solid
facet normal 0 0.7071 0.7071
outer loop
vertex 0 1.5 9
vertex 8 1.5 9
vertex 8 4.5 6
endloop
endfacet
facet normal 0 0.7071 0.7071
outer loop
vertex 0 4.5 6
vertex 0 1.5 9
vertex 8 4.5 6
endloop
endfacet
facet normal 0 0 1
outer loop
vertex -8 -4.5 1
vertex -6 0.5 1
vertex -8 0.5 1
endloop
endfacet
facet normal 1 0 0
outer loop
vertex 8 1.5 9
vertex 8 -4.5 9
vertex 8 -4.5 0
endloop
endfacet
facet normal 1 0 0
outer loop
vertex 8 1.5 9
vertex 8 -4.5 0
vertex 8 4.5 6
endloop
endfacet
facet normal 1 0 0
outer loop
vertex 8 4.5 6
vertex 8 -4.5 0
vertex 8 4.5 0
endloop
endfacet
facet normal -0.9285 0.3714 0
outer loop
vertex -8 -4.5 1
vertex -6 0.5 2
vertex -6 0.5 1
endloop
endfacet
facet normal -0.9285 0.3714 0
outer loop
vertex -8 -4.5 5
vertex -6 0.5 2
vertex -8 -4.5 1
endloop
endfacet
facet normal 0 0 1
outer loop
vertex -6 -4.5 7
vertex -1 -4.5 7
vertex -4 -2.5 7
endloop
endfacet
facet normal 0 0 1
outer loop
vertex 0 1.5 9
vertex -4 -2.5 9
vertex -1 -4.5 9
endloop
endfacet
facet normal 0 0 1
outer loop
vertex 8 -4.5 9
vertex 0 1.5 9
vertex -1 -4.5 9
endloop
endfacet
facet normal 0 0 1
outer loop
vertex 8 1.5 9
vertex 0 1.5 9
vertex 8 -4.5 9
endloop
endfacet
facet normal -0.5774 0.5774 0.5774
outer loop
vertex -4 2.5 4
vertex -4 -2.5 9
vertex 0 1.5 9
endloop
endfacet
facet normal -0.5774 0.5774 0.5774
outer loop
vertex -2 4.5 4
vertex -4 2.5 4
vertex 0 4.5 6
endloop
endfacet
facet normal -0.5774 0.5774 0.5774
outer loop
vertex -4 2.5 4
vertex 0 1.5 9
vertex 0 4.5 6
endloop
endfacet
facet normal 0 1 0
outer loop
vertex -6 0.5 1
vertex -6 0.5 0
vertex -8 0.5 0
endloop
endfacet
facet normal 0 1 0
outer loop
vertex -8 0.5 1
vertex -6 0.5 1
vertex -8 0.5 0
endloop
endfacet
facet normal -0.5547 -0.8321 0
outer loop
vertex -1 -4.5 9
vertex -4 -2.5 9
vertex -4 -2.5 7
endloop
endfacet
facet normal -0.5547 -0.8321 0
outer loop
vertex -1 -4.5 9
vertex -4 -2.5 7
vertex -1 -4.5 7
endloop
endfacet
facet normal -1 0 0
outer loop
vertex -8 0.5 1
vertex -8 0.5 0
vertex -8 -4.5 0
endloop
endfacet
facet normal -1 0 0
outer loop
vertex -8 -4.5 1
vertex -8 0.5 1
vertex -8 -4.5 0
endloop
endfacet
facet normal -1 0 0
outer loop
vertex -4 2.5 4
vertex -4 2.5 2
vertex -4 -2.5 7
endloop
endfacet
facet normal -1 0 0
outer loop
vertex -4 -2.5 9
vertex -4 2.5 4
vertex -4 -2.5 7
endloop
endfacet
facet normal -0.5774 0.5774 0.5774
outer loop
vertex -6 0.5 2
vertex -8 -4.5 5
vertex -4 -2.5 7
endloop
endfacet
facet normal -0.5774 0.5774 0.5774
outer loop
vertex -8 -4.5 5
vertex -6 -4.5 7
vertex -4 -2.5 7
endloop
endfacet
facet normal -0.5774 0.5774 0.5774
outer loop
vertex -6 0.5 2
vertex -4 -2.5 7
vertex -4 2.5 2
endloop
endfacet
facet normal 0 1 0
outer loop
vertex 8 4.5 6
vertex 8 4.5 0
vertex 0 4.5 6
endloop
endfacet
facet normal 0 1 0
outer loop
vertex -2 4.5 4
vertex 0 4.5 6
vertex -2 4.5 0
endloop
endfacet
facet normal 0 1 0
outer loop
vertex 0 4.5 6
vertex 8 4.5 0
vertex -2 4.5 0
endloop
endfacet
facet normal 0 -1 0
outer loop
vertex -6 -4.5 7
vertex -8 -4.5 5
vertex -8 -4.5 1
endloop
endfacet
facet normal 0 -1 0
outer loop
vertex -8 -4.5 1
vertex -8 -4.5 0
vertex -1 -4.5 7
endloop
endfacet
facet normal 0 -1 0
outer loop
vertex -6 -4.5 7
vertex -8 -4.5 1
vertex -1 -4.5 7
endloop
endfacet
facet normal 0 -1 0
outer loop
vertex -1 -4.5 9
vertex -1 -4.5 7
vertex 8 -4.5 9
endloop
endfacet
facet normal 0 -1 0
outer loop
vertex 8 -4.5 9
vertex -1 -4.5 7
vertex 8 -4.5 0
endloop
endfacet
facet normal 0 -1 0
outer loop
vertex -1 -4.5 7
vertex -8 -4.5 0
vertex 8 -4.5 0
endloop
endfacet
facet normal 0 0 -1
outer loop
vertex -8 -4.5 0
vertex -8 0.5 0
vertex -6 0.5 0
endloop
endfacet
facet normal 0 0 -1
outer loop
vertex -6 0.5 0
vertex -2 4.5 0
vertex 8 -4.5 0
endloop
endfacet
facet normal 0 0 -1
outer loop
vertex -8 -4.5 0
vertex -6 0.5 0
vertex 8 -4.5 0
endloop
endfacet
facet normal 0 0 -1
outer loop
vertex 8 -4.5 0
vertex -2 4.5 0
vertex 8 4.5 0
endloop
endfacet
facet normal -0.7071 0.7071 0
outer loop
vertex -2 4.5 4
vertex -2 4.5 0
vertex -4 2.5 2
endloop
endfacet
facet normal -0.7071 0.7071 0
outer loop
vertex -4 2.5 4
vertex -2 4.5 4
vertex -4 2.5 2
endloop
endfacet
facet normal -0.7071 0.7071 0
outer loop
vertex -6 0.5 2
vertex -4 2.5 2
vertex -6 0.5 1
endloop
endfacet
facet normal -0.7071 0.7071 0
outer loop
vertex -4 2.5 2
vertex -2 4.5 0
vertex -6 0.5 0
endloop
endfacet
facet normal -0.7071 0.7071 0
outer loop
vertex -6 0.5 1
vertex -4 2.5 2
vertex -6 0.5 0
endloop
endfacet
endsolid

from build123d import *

# Parameters (mm, degrees)
BOSS_EXTRUDE1_DEPTH = 9
CUT_EXTRUDE1_DEPTH  = 8
CUT_EXTRUDE2_DEPTH  = 8
CUT_EXTRUDE3_DEPTH  = 8
CUT_EXTRUDE4_DEPTH  = 8
CUT_EXTRUDE5_DEPTH  = 2


with BuildPart() as part:
    # Sketch1 → Boss-Extrude1 (new body)
    with BuildSketch(Plane.XY):
        Polygon((-6, 0.5), (-8, 0.5), (-8, -4.5), (8, -4.5), (8, 4.5), (-2, 4.5), align=None)
    extrude(amount=BOSS_EXTRUDE1_DEPTH)

    # Sketch2 → Cut-Extrude1 (cut)
    with BuildSketch(Plane.XY.offset(9)):
        Polygon((-8, 0.5), (-6, 0.5), (-8, -4.5), align=None)
    extrude(amount=-CUT_EXTRUDE1_DEPTH, mode=Mode.SUBTRACT)

    # 3DSketch1 → Cut-Extrude2 (cut, along a direction that is not the sketch's normal)
    with BuildSketch(Plane(origin=(-8, -4.5, 5), x_dir=(0.464990554975277, 0.8137334712067351, -0.3487429162314579), z_dir=(0.5773502691896258, -0.5773502691896257, -0.5773502691896258))):
        Polygon((0, 0), (6.044877215, -1.208080899), (8.602325267, 0), (2.78994333, 4.026936331), (0.232495277, 2.818855432), align=None)
    extrude(amount=-CUT_EXTRUDE2_DEPTH, dir=(0, 0, -1), mode=Mode.SUBTRACT)

    # 3DSketch2 → Cut-Extrude3 (cut, along a direction that is not the sketch's normal)
    with BuildSketch(Plane(origin=(-4, -2.5, 9), x_dir=(0.2264554068289193, 0.7925939239012171, -0.5661385170722979), z_dir=(0.5773502691896256, -0.5773502691896258, -0.5773502691896258))):
        Polygon((0, 0), (6.793662205, -1.961161351), (8.831760866, 0), (8.152394646, 2.745625892), (4.076197323, 3.922322703), align=None)
    extrude(amount=-CUT_EXTRUDE3_DEPTH, dir=(0, 0, -1), mode=Mode.SUBTRACT)

    # Sketch3 → Cut-Extrude4 (cut)
    with BuildSketch(Plane.ZY):
        Polygon((9, 1.5), (6, 4.5), (9, 4.5), align=None)
    extrude(amount=-CUT_EXTRUDE4_DEPTH, mode=Mode.SUBTRACT)

    # Sketch4 → Cut-Extrude5 (cut)
    with BuildSketch(Plane.XY.offset(9)):
        Polygon((-4, -2.5), (-1, -4.5), (-6, -4.5), align=None)
    extrude(amount=-CUT_EXTRUDE5_DEPTH, mode=Mode.SUBTRACT)


solid = part.part
